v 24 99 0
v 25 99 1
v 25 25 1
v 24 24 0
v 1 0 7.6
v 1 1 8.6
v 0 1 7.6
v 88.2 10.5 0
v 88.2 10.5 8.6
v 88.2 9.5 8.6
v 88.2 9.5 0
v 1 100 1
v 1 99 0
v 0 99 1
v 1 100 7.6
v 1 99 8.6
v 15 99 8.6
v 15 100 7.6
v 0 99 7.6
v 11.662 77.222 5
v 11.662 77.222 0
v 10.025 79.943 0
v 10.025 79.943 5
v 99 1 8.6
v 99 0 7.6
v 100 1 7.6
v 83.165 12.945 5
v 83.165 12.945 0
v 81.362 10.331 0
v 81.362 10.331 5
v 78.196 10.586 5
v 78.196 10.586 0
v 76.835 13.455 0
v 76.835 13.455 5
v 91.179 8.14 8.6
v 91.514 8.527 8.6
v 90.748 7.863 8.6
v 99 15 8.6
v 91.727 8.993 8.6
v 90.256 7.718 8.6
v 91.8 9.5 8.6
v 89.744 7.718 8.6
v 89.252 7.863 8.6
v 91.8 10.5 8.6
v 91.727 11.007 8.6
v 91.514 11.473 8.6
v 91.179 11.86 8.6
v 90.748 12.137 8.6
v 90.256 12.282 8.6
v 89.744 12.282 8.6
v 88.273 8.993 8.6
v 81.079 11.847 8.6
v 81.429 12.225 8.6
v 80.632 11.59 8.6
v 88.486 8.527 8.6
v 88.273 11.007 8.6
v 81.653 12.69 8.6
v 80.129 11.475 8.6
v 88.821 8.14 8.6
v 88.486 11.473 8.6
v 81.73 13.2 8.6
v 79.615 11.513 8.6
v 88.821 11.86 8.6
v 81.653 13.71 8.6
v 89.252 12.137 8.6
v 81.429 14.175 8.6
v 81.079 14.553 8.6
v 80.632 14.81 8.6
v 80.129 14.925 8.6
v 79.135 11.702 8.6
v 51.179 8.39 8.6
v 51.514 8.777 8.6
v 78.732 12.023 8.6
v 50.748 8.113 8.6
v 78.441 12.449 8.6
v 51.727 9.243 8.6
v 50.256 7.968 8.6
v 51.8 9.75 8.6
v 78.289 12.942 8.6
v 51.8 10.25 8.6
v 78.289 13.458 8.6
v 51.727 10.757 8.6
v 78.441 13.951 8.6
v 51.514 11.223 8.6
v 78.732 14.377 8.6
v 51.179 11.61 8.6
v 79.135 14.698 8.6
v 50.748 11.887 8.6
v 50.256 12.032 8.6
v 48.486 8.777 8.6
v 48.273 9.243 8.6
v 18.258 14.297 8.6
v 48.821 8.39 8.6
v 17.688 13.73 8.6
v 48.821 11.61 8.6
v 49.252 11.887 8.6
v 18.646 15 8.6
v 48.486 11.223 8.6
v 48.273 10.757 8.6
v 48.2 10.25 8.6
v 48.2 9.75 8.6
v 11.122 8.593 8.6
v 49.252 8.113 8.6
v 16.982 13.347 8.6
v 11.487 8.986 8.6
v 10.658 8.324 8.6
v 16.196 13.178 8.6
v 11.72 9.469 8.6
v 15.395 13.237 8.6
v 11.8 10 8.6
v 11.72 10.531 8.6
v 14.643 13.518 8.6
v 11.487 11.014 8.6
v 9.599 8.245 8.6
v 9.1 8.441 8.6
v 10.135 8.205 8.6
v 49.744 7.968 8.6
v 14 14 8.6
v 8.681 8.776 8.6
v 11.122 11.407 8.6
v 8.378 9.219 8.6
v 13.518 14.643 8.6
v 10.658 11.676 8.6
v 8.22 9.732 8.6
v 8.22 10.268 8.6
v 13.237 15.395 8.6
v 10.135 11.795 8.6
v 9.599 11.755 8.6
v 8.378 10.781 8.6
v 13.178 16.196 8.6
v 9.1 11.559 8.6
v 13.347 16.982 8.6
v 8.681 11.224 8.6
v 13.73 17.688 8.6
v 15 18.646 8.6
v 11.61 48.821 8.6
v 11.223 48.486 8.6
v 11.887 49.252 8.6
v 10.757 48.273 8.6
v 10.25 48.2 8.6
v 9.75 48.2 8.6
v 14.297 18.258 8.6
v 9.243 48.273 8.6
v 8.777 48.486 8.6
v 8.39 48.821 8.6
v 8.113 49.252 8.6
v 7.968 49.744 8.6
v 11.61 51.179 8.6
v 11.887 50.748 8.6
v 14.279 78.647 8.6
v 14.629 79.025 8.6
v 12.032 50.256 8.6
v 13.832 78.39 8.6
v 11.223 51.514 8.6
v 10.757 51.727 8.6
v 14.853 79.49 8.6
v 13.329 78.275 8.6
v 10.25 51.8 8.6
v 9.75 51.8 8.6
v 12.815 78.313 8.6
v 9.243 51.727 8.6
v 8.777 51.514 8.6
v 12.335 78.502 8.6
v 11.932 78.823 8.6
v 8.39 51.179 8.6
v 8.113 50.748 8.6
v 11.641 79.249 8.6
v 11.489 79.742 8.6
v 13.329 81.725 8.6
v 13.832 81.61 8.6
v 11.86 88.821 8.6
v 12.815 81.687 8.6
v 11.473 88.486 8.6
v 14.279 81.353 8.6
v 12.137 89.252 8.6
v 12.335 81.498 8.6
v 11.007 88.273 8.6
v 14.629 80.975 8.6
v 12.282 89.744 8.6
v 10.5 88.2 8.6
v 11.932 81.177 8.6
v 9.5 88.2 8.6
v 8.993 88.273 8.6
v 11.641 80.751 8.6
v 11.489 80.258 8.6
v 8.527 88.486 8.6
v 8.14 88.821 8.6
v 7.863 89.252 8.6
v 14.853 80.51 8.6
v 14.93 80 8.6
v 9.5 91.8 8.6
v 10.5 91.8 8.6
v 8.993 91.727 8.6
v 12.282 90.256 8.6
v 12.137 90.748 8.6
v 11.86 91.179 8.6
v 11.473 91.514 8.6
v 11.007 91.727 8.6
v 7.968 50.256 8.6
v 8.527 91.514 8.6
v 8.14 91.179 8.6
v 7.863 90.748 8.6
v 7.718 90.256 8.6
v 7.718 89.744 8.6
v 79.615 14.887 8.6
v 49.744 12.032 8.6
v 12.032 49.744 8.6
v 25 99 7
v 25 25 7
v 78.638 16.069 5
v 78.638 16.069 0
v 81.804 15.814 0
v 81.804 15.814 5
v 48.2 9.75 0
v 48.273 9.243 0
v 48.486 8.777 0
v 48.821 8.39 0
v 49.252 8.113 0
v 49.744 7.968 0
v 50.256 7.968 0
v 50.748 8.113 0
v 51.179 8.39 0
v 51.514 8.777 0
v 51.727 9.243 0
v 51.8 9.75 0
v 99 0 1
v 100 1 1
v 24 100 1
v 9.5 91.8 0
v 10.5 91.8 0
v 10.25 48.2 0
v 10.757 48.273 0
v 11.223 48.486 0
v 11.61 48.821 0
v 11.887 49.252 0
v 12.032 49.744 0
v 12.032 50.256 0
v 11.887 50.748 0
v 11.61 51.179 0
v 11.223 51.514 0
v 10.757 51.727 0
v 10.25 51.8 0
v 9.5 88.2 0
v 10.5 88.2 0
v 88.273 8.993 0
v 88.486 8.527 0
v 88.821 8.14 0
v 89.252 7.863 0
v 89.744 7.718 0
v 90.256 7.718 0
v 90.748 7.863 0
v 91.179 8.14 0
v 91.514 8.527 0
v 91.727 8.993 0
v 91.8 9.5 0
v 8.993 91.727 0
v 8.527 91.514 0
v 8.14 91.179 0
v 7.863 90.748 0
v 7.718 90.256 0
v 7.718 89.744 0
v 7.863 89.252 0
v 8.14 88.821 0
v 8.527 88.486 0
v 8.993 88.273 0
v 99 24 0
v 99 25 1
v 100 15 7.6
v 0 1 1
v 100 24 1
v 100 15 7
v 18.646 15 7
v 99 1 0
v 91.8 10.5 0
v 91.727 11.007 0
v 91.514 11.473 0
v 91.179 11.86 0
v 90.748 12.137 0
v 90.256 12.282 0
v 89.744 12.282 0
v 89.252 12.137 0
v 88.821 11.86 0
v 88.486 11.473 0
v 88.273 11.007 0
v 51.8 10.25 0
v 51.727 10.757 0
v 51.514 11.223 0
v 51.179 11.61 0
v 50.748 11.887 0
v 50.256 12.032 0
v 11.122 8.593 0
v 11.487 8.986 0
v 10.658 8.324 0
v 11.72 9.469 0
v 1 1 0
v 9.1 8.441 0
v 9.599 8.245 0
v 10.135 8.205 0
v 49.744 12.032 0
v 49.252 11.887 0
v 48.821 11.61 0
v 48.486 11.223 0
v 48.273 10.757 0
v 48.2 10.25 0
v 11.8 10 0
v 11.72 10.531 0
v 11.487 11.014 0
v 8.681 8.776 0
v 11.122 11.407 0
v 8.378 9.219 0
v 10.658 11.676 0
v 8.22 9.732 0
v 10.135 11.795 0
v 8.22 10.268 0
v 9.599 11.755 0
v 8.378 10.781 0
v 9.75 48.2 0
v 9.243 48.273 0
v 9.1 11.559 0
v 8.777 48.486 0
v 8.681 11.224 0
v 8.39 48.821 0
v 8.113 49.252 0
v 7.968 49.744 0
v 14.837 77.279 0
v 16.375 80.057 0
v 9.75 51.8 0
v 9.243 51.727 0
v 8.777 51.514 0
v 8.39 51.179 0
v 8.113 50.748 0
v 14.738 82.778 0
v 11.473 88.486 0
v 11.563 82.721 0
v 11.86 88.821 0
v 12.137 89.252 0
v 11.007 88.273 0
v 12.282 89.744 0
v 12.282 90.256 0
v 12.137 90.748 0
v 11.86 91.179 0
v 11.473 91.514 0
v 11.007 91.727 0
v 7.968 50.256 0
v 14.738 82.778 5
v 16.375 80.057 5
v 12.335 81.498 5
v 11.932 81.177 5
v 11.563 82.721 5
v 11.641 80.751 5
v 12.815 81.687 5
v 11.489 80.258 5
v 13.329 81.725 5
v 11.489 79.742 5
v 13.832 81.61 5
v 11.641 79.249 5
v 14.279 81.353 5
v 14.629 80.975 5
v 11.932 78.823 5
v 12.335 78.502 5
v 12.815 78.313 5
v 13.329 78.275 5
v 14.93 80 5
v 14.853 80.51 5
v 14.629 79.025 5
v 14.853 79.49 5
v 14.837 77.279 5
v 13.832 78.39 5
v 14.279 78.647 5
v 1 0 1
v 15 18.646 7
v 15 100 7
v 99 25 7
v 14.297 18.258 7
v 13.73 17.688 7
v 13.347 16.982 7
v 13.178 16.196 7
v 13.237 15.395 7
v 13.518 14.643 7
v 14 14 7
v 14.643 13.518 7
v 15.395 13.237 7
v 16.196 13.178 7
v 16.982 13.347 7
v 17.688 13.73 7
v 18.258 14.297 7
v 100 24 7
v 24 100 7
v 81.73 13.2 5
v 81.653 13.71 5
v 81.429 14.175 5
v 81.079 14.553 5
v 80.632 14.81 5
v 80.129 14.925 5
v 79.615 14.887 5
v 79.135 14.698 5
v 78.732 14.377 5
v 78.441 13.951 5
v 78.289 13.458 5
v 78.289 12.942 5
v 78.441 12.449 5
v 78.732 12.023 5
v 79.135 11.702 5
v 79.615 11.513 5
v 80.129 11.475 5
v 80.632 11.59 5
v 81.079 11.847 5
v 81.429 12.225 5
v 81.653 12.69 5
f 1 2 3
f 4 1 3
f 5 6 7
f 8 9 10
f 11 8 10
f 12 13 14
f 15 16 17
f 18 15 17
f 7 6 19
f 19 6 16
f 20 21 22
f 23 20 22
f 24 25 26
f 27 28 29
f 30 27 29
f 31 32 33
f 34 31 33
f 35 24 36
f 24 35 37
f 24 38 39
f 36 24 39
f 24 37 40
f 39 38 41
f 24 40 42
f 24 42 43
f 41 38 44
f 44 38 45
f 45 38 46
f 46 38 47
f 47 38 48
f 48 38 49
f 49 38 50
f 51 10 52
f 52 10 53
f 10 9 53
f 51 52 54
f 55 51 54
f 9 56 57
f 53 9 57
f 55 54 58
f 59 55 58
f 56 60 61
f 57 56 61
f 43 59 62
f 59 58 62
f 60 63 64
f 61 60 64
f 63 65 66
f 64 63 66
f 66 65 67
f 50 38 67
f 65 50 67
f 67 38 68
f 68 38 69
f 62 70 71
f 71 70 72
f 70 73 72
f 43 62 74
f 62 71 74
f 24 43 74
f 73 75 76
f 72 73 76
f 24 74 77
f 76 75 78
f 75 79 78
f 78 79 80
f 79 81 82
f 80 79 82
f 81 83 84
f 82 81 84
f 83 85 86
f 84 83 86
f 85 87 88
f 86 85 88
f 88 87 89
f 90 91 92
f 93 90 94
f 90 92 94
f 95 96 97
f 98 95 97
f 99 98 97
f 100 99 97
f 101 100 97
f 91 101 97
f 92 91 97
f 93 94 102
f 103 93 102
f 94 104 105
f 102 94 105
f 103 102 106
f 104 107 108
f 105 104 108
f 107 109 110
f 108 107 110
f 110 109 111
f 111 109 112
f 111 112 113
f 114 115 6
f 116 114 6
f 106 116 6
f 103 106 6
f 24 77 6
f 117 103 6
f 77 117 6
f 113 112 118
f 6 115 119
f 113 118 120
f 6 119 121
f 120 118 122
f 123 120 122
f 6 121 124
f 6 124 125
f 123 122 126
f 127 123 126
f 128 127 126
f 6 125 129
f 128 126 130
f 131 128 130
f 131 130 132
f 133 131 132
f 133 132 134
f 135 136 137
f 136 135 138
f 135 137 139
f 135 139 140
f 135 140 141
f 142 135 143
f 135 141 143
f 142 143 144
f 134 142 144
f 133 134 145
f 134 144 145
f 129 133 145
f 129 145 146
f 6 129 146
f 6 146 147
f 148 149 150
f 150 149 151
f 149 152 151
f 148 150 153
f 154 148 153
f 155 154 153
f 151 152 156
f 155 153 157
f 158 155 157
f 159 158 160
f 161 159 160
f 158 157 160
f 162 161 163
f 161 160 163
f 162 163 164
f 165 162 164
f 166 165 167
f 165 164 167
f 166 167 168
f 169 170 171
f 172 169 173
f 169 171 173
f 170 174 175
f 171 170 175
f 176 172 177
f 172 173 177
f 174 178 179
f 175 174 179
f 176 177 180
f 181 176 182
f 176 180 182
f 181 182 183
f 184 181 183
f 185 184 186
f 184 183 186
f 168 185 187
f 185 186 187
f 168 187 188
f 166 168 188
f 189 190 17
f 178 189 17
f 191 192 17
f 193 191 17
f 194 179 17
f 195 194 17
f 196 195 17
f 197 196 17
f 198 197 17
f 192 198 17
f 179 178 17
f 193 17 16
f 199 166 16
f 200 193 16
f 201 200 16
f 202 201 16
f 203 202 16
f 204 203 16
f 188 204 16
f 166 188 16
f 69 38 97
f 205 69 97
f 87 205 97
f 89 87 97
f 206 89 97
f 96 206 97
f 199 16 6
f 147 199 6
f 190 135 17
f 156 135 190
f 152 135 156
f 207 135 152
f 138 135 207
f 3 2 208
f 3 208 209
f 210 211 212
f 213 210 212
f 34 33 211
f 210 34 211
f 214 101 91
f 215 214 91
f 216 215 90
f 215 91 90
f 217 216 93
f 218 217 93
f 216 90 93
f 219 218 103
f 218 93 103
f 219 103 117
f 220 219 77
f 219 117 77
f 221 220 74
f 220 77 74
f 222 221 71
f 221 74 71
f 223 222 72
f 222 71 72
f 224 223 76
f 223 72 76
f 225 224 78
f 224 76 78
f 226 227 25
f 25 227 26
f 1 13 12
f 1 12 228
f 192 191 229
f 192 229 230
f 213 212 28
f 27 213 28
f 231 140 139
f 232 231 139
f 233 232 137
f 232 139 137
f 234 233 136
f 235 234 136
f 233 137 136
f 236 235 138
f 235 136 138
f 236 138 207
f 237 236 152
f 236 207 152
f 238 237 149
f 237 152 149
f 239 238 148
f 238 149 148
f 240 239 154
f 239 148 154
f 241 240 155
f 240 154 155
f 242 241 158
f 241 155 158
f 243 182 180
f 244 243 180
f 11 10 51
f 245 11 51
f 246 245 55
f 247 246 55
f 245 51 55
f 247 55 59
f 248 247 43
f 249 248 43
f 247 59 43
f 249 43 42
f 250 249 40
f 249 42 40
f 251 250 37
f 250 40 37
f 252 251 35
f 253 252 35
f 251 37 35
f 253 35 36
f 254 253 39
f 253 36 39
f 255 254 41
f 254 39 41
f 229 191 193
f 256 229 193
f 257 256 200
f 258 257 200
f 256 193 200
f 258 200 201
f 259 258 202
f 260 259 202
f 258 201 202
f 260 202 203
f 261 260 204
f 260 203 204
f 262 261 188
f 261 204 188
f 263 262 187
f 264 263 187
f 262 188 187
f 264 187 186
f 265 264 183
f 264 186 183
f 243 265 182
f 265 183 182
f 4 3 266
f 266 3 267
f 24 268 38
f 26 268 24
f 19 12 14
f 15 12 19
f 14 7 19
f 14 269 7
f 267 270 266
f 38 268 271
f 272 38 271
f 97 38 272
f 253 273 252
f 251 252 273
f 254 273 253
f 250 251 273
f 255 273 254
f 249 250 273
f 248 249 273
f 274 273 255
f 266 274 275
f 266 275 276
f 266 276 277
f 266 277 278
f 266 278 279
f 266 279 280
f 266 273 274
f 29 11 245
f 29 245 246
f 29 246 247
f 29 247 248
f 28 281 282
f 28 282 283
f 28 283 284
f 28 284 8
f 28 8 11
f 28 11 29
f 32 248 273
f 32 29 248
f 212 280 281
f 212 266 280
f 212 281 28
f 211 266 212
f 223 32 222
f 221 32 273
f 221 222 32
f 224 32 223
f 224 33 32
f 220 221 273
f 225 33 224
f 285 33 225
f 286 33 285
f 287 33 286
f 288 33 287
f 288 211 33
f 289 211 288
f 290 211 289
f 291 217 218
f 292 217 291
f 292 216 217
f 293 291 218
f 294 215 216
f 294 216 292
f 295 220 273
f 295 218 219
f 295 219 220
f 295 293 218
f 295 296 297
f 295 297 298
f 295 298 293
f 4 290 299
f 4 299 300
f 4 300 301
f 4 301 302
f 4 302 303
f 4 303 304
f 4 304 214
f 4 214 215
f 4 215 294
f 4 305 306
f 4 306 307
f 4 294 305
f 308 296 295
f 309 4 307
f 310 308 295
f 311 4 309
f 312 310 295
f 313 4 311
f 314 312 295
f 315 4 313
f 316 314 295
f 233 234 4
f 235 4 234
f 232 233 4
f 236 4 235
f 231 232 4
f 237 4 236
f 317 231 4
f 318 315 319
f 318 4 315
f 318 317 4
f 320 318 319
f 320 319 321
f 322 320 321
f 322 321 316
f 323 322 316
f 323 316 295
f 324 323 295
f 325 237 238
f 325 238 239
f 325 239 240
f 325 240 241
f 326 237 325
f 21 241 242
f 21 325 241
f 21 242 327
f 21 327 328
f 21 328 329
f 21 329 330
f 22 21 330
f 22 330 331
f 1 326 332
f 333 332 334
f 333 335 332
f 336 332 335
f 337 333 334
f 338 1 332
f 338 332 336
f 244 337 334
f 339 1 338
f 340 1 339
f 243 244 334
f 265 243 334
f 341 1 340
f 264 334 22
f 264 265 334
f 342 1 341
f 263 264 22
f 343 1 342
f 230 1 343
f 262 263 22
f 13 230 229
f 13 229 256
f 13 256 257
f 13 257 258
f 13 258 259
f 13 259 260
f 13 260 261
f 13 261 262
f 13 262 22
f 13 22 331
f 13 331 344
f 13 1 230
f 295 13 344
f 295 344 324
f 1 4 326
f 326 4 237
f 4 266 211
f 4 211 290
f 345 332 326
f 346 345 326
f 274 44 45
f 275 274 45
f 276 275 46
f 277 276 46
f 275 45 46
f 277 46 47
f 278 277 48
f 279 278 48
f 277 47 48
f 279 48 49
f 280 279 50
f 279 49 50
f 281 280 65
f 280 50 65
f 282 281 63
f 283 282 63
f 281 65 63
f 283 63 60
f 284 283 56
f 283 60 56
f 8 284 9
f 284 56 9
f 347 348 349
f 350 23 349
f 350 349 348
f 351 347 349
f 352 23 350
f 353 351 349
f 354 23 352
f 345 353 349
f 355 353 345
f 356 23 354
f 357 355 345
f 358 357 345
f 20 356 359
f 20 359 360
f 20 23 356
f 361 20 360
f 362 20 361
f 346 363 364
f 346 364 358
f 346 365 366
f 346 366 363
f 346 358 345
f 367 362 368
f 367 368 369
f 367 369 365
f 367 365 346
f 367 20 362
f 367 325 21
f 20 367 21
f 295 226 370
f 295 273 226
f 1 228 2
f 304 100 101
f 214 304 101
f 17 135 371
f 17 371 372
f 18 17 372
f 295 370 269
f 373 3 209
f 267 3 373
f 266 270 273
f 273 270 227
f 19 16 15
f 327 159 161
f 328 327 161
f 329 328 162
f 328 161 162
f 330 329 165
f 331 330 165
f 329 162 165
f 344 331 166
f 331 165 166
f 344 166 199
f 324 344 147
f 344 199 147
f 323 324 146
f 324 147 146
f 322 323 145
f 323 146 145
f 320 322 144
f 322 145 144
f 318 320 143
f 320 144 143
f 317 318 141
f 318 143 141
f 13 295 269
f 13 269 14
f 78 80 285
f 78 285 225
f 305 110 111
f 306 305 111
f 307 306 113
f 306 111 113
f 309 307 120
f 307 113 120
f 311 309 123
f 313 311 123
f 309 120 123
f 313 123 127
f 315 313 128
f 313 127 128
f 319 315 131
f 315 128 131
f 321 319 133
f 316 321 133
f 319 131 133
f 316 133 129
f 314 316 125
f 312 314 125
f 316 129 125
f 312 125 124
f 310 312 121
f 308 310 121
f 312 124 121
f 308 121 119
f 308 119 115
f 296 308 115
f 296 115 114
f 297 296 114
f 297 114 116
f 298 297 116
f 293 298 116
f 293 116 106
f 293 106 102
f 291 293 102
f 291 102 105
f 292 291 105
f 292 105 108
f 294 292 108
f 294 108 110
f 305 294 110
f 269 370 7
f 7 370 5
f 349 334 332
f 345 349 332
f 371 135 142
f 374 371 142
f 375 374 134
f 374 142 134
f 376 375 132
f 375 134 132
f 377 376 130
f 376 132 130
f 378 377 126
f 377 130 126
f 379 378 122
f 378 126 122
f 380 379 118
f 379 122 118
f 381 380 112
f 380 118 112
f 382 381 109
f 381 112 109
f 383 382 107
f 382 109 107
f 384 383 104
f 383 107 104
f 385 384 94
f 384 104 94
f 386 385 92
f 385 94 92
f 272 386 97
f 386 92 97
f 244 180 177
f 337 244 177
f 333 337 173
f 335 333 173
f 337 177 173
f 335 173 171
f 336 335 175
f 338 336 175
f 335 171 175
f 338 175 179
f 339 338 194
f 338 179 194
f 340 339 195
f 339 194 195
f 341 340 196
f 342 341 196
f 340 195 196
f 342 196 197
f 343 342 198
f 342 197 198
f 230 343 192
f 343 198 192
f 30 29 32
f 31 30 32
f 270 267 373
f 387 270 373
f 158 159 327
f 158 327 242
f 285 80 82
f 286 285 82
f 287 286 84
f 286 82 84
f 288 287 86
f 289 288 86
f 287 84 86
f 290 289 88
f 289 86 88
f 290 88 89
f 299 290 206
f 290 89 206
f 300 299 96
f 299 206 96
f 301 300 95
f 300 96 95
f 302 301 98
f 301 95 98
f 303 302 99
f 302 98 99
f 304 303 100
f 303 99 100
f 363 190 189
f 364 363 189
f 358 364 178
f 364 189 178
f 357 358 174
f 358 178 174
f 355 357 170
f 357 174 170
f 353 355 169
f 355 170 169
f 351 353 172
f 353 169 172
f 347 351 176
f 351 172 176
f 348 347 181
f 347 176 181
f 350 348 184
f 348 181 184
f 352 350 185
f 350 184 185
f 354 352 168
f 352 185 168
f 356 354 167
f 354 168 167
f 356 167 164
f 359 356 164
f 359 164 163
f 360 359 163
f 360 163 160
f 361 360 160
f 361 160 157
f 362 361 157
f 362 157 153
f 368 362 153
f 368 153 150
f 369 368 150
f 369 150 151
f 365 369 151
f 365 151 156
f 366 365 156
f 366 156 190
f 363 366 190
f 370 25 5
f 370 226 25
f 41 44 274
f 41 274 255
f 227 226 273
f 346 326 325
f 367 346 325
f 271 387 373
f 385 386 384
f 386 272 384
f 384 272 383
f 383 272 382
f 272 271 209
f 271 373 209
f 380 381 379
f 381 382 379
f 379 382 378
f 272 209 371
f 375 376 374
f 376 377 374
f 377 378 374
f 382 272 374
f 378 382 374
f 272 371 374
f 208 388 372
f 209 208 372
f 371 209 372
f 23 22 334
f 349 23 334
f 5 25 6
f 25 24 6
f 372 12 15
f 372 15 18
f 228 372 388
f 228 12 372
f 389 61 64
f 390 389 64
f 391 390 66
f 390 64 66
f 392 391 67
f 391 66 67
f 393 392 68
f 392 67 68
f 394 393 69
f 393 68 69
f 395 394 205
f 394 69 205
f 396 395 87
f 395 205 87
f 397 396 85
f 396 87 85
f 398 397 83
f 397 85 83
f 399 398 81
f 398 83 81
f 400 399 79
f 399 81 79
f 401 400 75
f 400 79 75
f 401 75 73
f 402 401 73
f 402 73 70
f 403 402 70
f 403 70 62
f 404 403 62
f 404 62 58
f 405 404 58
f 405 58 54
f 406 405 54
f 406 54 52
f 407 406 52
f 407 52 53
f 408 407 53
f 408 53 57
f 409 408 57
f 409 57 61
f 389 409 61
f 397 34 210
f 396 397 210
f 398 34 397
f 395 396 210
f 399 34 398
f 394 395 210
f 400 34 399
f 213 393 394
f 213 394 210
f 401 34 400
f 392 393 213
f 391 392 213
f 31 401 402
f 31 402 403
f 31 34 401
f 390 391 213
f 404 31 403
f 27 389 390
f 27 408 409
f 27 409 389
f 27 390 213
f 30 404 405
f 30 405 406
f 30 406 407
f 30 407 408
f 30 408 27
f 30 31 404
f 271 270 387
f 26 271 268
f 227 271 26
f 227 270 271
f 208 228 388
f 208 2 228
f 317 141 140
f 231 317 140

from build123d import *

# Parameters (mm, degrees)
PAD_DEPTH       = 8.6
SKETCH001_R     = 1.8
SKETCH001_R_2   = 1.73
POCKET_DEPTH    = 8.601
POCKET001_DEPTH = 1.6
POCKET002_DEPTH = 5
CHAMFER_SIZE    = 1


with BuildPart() as part:
    # Sketch → Pad (new body)
    with BuildSketch(Plane.XY):
        Polygon((0, 0), (0, 100), (25, 100), (25, 25), (100, 25), (100, 0), align=None)
    extrude(amount=PAD_DEPTH)

    # Sketch001 → Pocket (cut, through all)
    with BuildSketch(Plane.XY.offset(8.6)):
        with Locations((10, 10)):
            Circle(SKETCH001_R)
        with Locations((80, 13.2)):
            Circle(SKETCH001_R_2)
        with Locations((13.2, 80)):
            Circle(SKETCH001_R_2)
        with BuildLine():
            ThreePointArc((9.75, 51.8), (7.95, 50), (9.75, 48.2))
            Line((9.75, 48.2), (10.25, 48.2))
            ThreePointArc((10.25, 48.2), (12.05, 50), (10.25, 51.8))
            Line((9.75, 51.8), (10.25, 51.8))
        make_face()
        with BuildLine():
            ThreePointArc((9.5, 91.8), (7.7, 90), (9.5, 88.2))
            Line((9.5, 88.2), (10.5, 88.2))
            ThreePointArc((10.5, 88.2), (12.3, 90), (10.5, 91.8))
            Line((9.5, 91.8), (10.5, 91.8))
        make_face()
        with BuildLine():
            ThreePointArc((51.8, 10.25), (50, 12.05), (48.2, 10.25))
            Line((48.2, 10.25), (48.2, 9.75))
            ThreePointArc((48.2, 9.75), (50, 7.95), (51.8, 9.75))
            Line((51.8, 10.25), (51.8, 9.75))
        make_face()
        with BuildLine():
            ThreePointArc((91.8, 10.5), (90, 12.3), (88.2, 10.5))
            Line((88.2, 10.5), (88.2, 9.5))
            ThreePointArc((88.2, 9.5), (90, 7.7), (91.8, 9.5))
            Line((91.8, 10.5), (91.8, 9.5))
        make_face()
    extrude(amount=-POCKET_DEPTH, mode=Mode.SUBTRACT)

    # Sketch002 → Pocket001 (cut)
    with BuildSketch(Plane.XY.offset(8.6)):
        with BuildLine():
            Line((15, 110), (110, 110))
            Line((110, 110), (110, 15))
            Line((110, 15), (18.645751, 15))
            ThreePointArc((15, 18.645751), (14, 14), (18.645751, 15))
            Line((15, 18.645751), (15, 110))
        make_face()
    extrude(amount=-POCKET001_DEPTH, mode=Mode.SUBTRACT)

    # Sketch003 → Pocket002 (cut)
    with BuildSketch(Plane(origin=(0, 0, 0), x_dir=(1, 0, 0), z_dir=(0, 0, -1))):
        Polygon((81.80356, -15.813523), (83.165158, -12.944833), (81.361598, -10.331309), (78.19644, -10.586477), (76.834842, -13.455167), (78.638402, -16.068691), align=None)
        Polygon((16.374919, -80.056763), (14.836618, -77.278821), (11.661699, -77.222058), (10.025081, -79.943237), (11.563382, -82.721179), (14.738301, -82.777942), align=None)
    extrude(amount=-POCKET002_DEPTH, mode=Mode.SUBTRACT)

    # Chamfer
    chamfer_edges = [part.edges().sort_by_distance(p)[0] for p in [
        (50, 0, 8.6),
        (0, 50, 8.6),
        (50, 0, 0),
        (0, 0, 4.3),
        (100, 0, 4.3),
        (100, 7.5, 8.6),
        (100, 12.5, 0),
        (100, 25, 3.5),
        (25, 100, 3.5),
        (7.5, 100, 8.6),
        (0, 50, 0),
        (12.5, 100, 0),
        (25, 62.5, 0),
        (62.5, 25, 0),
        (0, 100, 4.3),
    ]]
    chamfer(chamfer_edges, length=CHAMFER_SIZE)


solid = part.part
